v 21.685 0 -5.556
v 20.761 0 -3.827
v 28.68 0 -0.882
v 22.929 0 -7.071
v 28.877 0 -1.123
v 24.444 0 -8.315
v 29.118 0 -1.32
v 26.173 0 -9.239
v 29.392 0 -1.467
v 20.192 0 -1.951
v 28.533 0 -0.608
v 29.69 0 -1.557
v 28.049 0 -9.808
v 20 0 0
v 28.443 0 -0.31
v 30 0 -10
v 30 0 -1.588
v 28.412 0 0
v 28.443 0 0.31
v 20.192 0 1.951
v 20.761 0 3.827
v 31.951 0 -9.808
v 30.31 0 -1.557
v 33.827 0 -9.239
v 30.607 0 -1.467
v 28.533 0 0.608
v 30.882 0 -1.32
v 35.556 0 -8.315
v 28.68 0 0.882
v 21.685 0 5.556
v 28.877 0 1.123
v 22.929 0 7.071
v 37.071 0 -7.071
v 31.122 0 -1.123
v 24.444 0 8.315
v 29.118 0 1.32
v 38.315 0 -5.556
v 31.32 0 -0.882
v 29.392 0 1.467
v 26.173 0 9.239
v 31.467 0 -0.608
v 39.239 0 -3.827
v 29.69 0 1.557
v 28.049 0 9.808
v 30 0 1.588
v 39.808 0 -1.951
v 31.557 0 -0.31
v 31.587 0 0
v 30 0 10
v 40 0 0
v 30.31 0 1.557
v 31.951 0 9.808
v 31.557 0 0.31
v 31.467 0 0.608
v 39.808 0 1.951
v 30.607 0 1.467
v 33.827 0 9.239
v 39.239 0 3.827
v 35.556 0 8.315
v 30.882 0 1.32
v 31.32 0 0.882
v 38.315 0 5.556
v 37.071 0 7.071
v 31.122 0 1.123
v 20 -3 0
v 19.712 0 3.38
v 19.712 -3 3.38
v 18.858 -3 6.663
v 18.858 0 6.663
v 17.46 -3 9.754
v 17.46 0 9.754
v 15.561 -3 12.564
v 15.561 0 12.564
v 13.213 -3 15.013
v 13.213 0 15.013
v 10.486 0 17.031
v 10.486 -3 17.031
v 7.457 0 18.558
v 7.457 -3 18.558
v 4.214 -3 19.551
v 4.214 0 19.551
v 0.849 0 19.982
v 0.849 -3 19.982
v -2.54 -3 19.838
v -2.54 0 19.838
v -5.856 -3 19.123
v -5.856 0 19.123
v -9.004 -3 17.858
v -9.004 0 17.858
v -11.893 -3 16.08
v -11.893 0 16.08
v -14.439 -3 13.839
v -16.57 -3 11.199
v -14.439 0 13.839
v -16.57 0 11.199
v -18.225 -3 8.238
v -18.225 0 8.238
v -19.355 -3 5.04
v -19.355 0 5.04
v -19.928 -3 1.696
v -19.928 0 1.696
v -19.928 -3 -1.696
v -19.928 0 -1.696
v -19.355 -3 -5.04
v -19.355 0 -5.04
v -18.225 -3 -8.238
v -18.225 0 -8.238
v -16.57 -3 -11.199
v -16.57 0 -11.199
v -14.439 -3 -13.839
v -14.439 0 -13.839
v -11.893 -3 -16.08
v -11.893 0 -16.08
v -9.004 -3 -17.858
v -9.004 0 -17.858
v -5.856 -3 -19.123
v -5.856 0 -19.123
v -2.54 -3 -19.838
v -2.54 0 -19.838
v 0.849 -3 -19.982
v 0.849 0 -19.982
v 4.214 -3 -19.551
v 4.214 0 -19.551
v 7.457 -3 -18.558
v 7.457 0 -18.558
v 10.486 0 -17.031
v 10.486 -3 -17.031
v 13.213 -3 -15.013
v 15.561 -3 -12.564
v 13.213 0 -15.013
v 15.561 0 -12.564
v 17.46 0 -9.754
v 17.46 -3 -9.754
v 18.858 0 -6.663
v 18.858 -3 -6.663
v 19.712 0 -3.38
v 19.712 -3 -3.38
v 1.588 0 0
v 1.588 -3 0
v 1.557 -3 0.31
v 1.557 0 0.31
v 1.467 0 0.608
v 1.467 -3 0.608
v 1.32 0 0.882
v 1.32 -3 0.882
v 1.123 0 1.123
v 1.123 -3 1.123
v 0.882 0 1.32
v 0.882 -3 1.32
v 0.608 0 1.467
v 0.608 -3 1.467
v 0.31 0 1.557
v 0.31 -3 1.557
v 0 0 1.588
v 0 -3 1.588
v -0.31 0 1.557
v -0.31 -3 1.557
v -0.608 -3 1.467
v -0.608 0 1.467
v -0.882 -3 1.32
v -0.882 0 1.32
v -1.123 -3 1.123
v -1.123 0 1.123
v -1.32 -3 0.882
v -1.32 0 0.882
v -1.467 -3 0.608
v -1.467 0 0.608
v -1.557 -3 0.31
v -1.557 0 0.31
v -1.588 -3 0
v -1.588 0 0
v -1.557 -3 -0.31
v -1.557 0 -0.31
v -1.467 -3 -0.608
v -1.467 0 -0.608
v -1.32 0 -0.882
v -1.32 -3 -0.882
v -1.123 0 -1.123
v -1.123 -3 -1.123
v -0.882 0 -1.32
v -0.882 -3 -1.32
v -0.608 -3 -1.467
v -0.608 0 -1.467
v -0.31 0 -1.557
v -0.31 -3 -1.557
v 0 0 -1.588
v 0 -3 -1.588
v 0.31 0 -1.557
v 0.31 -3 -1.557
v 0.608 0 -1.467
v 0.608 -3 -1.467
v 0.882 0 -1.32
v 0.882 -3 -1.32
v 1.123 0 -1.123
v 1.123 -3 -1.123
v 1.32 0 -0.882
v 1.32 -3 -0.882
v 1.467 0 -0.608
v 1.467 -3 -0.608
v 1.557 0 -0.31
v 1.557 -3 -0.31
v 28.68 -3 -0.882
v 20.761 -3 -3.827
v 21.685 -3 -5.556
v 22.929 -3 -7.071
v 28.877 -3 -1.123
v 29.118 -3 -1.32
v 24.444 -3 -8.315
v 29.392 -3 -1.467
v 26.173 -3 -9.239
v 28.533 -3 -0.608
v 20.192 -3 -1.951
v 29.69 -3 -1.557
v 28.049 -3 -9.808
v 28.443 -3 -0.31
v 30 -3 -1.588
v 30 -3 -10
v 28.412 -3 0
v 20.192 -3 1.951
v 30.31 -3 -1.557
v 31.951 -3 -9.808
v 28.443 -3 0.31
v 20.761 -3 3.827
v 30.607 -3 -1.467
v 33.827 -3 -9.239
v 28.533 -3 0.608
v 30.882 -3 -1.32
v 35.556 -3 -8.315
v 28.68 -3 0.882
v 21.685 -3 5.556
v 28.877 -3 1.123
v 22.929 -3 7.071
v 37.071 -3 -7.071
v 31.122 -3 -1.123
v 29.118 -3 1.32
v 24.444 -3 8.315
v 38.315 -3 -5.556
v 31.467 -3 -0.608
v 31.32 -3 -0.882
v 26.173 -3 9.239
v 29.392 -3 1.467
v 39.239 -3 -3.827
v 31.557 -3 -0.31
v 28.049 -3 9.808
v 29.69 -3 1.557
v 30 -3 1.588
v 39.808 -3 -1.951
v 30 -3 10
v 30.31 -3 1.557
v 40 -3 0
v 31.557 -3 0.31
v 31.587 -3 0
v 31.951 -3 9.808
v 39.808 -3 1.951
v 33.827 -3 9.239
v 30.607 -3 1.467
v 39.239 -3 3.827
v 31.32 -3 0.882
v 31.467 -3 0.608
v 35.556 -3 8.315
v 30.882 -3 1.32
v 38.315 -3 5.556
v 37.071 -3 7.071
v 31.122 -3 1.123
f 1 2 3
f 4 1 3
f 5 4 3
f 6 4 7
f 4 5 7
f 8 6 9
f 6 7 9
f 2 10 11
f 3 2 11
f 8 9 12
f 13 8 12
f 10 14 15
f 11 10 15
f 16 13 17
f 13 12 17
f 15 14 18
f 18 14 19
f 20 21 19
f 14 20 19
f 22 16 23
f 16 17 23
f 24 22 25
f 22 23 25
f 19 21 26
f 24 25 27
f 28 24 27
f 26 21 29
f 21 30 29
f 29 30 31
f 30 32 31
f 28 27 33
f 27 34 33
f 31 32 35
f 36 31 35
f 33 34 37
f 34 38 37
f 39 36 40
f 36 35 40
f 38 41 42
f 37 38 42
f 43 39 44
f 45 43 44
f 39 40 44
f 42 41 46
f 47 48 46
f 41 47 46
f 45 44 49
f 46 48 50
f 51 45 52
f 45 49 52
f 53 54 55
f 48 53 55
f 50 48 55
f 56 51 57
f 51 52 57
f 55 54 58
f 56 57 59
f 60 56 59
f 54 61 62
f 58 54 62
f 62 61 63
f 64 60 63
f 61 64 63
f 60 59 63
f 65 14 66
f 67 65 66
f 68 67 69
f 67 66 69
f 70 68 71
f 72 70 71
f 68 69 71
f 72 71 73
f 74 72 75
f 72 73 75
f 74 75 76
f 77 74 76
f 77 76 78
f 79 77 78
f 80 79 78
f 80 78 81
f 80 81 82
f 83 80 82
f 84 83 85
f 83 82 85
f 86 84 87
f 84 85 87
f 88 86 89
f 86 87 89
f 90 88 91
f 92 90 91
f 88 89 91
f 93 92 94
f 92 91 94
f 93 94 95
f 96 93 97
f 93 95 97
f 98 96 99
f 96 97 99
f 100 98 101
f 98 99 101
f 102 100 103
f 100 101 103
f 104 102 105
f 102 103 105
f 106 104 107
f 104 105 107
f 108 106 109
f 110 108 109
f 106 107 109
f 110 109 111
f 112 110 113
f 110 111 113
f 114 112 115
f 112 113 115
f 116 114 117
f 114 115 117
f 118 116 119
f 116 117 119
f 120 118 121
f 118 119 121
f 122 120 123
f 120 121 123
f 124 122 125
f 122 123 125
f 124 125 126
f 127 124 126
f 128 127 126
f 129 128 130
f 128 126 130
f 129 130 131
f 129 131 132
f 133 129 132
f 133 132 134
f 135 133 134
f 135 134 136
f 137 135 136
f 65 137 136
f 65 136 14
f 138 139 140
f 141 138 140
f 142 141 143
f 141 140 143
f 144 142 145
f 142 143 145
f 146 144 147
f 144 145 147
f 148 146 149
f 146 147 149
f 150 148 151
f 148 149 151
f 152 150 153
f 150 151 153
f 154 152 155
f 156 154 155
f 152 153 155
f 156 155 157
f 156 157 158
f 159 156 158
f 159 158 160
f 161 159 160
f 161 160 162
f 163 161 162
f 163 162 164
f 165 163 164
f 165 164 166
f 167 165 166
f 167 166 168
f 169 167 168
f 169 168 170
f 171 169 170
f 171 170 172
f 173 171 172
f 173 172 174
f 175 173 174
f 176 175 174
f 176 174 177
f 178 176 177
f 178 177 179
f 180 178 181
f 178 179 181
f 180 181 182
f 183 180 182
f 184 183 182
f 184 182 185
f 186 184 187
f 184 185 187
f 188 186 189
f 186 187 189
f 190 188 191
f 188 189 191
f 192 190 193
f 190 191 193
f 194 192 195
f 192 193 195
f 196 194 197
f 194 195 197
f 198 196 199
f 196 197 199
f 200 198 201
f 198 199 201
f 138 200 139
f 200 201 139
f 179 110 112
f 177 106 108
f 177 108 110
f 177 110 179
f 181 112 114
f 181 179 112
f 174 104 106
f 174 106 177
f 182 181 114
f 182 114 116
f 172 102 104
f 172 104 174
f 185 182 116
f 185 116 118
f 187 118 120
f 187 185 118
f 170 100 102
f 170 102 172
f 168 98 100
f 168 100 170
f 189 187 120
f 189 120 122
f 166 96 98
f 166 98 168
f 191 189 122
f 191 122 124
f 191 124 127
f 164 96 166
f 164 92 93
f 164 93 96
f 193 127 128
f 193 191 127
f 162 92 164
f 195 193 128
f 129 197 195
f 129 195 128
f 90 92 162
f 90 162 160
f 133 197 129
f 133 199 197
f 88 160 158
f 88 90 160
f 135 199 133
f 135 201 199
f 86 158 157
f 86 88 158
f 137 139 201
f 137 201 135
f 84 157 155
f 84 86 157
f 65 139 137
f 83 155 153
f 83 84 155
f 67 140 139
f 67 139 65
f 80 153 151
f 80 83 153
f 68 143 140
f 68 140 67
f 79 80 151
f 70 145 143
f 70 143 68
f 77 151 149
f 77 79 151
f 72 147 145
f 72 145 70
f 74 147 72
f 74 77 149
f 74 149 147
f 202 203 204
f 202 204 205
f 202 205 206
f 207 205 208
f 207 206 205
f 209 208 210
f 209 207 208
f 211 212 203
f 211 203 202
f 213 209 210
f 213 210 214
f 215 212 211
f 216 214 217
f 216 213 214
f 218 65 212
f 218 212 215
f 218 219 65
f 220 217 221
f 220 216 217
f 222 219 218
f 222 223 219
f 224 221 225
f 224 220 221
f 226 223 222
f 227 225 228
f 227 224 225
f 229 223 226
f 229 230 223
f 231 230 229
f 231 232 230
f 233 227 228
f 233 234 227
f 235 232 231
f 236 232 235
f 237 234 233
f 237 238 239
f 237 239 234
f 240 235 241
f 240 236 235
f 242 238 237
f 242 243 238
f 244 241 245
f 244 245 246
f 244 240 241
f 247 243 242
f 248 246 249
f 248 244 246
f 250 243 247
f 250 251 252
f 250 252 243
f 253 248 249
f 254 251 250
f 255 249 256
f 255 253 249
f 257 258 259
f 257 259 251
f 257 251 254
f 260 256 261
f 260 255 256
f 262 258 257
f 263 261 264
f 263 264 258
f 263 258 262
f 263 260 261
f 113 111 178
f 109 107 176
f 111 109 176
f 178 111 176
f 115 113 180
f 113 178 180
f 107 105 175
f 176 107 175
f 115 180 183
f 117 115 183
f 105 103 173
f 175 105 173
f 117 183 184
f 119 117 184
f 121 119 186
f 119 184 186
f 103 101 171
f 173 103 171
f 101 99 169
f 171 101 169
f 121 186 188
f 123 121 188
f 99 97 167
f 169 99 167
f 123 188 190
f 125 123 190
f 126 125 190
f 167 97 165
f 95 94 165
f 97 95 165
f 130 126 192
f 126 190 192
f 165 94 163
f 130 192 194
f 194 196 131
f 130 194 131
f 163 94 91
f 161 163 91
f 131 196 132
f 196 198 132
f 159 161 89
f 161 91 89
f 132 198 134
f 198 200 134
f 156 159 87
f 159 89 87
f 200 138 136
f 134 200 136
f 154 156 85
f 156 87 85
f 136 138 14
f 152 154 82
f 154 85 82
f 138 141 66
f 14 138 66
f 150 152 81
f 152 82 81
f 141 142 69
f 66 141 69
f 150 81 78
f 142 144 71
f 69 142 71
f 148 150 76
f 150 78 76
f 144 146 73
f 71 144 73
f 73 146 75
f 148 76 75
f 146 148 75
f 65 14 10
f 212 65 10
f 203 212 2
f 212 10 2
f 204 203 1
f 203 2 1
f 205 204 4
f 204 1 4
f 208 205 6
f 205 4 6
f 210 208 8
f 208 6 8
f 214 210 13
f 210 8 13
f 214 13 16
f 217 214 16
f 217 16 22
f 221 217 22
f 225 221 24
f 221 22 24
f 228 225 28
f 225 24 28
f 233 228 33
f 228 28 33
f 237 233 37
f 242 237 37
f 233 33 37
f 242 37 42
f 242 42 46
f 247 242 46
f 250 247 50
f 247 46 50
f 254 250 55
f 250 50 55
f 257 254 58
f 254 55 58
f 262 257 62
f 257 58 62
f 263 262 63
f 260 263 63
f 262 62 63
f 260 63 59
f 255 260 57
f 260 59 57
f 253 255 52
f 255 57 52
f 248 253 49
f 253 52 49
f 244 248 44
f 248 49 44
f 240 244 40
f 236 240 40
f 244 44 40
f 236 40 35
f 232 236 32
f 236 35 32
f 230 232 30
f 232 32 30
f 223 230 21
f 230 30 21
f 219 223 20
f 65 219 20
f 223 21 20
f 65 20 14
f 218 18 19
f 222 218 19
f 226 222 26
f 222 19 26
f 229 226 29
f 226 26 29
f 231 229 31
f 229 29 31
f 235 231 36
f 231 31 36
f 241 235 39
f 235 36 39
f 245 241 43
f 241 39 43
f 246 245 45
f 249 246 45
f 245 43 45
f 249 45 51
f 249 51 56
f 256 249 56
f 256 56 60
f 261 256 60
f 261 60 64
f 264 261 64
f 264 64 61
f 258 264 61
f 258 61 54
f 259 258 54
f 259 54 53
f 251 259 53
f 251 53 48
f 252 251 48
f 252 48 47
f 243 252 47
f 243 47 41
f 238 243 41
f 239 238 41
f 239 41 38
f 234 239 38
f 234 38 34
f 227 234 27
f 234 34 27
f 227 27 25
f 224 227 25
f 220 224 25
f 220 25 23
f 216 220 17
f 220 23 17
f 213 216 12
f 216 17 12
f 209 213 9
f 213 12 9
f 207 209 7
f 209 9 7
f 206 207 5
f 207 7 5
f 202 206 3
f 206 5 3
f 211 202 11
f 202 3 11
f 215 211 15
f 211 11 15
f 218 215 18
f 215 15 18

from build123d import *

# Parameters (mm, degrees)
F0_R     = 19.99996
F1_DEPTH = 2.999994
F2_R     = 1.5875
F3_DEPTH = 25.4
F4_R     = 1.5875
F5_DEPTH = 25.4


with BuildPart() as f1:
    # F0 (on Front) → F1 (new body)
    with BuildSketch(Plane.XZ):
        Circle(F0_R)
        with BuildLine():
            ThreePointArc((39.99992, 0), (29.99994, 9.99998), (19.99996, 0))
            Line((19.99996, 0), (39.99992, 0))
        make_face()
        with BuildLine():
            Line((39.99992, 0), (19.99996, 0))
            ThreePointArc((19.99996, 0), (29.99994, -9.99998), (39.99992, 0))
        make_face()
    extrude(amount=F1_DEPTH)

    # F2 (on face) → F3 (cut)
    with BuildSketch(Plane.XZ.offset(2.999994)):
        Circle(F2_R)
    extrude(amount=-F3_DEPTH, mode=Mode.SUBTRACT)

    # F4 (on face) → F5 (cut)
    with BuildSketch(Plane(origin=(0, 0, 0), x_dir=(-1, 0, 0), z_dir=(0, 1, 0))):
        with Locations((-29.99994, 0)):
            Circle(F4_R)
    extrude(amount=-F5_DEPTH, mode=Mode.SUBTRACT)


solid = f1.part
